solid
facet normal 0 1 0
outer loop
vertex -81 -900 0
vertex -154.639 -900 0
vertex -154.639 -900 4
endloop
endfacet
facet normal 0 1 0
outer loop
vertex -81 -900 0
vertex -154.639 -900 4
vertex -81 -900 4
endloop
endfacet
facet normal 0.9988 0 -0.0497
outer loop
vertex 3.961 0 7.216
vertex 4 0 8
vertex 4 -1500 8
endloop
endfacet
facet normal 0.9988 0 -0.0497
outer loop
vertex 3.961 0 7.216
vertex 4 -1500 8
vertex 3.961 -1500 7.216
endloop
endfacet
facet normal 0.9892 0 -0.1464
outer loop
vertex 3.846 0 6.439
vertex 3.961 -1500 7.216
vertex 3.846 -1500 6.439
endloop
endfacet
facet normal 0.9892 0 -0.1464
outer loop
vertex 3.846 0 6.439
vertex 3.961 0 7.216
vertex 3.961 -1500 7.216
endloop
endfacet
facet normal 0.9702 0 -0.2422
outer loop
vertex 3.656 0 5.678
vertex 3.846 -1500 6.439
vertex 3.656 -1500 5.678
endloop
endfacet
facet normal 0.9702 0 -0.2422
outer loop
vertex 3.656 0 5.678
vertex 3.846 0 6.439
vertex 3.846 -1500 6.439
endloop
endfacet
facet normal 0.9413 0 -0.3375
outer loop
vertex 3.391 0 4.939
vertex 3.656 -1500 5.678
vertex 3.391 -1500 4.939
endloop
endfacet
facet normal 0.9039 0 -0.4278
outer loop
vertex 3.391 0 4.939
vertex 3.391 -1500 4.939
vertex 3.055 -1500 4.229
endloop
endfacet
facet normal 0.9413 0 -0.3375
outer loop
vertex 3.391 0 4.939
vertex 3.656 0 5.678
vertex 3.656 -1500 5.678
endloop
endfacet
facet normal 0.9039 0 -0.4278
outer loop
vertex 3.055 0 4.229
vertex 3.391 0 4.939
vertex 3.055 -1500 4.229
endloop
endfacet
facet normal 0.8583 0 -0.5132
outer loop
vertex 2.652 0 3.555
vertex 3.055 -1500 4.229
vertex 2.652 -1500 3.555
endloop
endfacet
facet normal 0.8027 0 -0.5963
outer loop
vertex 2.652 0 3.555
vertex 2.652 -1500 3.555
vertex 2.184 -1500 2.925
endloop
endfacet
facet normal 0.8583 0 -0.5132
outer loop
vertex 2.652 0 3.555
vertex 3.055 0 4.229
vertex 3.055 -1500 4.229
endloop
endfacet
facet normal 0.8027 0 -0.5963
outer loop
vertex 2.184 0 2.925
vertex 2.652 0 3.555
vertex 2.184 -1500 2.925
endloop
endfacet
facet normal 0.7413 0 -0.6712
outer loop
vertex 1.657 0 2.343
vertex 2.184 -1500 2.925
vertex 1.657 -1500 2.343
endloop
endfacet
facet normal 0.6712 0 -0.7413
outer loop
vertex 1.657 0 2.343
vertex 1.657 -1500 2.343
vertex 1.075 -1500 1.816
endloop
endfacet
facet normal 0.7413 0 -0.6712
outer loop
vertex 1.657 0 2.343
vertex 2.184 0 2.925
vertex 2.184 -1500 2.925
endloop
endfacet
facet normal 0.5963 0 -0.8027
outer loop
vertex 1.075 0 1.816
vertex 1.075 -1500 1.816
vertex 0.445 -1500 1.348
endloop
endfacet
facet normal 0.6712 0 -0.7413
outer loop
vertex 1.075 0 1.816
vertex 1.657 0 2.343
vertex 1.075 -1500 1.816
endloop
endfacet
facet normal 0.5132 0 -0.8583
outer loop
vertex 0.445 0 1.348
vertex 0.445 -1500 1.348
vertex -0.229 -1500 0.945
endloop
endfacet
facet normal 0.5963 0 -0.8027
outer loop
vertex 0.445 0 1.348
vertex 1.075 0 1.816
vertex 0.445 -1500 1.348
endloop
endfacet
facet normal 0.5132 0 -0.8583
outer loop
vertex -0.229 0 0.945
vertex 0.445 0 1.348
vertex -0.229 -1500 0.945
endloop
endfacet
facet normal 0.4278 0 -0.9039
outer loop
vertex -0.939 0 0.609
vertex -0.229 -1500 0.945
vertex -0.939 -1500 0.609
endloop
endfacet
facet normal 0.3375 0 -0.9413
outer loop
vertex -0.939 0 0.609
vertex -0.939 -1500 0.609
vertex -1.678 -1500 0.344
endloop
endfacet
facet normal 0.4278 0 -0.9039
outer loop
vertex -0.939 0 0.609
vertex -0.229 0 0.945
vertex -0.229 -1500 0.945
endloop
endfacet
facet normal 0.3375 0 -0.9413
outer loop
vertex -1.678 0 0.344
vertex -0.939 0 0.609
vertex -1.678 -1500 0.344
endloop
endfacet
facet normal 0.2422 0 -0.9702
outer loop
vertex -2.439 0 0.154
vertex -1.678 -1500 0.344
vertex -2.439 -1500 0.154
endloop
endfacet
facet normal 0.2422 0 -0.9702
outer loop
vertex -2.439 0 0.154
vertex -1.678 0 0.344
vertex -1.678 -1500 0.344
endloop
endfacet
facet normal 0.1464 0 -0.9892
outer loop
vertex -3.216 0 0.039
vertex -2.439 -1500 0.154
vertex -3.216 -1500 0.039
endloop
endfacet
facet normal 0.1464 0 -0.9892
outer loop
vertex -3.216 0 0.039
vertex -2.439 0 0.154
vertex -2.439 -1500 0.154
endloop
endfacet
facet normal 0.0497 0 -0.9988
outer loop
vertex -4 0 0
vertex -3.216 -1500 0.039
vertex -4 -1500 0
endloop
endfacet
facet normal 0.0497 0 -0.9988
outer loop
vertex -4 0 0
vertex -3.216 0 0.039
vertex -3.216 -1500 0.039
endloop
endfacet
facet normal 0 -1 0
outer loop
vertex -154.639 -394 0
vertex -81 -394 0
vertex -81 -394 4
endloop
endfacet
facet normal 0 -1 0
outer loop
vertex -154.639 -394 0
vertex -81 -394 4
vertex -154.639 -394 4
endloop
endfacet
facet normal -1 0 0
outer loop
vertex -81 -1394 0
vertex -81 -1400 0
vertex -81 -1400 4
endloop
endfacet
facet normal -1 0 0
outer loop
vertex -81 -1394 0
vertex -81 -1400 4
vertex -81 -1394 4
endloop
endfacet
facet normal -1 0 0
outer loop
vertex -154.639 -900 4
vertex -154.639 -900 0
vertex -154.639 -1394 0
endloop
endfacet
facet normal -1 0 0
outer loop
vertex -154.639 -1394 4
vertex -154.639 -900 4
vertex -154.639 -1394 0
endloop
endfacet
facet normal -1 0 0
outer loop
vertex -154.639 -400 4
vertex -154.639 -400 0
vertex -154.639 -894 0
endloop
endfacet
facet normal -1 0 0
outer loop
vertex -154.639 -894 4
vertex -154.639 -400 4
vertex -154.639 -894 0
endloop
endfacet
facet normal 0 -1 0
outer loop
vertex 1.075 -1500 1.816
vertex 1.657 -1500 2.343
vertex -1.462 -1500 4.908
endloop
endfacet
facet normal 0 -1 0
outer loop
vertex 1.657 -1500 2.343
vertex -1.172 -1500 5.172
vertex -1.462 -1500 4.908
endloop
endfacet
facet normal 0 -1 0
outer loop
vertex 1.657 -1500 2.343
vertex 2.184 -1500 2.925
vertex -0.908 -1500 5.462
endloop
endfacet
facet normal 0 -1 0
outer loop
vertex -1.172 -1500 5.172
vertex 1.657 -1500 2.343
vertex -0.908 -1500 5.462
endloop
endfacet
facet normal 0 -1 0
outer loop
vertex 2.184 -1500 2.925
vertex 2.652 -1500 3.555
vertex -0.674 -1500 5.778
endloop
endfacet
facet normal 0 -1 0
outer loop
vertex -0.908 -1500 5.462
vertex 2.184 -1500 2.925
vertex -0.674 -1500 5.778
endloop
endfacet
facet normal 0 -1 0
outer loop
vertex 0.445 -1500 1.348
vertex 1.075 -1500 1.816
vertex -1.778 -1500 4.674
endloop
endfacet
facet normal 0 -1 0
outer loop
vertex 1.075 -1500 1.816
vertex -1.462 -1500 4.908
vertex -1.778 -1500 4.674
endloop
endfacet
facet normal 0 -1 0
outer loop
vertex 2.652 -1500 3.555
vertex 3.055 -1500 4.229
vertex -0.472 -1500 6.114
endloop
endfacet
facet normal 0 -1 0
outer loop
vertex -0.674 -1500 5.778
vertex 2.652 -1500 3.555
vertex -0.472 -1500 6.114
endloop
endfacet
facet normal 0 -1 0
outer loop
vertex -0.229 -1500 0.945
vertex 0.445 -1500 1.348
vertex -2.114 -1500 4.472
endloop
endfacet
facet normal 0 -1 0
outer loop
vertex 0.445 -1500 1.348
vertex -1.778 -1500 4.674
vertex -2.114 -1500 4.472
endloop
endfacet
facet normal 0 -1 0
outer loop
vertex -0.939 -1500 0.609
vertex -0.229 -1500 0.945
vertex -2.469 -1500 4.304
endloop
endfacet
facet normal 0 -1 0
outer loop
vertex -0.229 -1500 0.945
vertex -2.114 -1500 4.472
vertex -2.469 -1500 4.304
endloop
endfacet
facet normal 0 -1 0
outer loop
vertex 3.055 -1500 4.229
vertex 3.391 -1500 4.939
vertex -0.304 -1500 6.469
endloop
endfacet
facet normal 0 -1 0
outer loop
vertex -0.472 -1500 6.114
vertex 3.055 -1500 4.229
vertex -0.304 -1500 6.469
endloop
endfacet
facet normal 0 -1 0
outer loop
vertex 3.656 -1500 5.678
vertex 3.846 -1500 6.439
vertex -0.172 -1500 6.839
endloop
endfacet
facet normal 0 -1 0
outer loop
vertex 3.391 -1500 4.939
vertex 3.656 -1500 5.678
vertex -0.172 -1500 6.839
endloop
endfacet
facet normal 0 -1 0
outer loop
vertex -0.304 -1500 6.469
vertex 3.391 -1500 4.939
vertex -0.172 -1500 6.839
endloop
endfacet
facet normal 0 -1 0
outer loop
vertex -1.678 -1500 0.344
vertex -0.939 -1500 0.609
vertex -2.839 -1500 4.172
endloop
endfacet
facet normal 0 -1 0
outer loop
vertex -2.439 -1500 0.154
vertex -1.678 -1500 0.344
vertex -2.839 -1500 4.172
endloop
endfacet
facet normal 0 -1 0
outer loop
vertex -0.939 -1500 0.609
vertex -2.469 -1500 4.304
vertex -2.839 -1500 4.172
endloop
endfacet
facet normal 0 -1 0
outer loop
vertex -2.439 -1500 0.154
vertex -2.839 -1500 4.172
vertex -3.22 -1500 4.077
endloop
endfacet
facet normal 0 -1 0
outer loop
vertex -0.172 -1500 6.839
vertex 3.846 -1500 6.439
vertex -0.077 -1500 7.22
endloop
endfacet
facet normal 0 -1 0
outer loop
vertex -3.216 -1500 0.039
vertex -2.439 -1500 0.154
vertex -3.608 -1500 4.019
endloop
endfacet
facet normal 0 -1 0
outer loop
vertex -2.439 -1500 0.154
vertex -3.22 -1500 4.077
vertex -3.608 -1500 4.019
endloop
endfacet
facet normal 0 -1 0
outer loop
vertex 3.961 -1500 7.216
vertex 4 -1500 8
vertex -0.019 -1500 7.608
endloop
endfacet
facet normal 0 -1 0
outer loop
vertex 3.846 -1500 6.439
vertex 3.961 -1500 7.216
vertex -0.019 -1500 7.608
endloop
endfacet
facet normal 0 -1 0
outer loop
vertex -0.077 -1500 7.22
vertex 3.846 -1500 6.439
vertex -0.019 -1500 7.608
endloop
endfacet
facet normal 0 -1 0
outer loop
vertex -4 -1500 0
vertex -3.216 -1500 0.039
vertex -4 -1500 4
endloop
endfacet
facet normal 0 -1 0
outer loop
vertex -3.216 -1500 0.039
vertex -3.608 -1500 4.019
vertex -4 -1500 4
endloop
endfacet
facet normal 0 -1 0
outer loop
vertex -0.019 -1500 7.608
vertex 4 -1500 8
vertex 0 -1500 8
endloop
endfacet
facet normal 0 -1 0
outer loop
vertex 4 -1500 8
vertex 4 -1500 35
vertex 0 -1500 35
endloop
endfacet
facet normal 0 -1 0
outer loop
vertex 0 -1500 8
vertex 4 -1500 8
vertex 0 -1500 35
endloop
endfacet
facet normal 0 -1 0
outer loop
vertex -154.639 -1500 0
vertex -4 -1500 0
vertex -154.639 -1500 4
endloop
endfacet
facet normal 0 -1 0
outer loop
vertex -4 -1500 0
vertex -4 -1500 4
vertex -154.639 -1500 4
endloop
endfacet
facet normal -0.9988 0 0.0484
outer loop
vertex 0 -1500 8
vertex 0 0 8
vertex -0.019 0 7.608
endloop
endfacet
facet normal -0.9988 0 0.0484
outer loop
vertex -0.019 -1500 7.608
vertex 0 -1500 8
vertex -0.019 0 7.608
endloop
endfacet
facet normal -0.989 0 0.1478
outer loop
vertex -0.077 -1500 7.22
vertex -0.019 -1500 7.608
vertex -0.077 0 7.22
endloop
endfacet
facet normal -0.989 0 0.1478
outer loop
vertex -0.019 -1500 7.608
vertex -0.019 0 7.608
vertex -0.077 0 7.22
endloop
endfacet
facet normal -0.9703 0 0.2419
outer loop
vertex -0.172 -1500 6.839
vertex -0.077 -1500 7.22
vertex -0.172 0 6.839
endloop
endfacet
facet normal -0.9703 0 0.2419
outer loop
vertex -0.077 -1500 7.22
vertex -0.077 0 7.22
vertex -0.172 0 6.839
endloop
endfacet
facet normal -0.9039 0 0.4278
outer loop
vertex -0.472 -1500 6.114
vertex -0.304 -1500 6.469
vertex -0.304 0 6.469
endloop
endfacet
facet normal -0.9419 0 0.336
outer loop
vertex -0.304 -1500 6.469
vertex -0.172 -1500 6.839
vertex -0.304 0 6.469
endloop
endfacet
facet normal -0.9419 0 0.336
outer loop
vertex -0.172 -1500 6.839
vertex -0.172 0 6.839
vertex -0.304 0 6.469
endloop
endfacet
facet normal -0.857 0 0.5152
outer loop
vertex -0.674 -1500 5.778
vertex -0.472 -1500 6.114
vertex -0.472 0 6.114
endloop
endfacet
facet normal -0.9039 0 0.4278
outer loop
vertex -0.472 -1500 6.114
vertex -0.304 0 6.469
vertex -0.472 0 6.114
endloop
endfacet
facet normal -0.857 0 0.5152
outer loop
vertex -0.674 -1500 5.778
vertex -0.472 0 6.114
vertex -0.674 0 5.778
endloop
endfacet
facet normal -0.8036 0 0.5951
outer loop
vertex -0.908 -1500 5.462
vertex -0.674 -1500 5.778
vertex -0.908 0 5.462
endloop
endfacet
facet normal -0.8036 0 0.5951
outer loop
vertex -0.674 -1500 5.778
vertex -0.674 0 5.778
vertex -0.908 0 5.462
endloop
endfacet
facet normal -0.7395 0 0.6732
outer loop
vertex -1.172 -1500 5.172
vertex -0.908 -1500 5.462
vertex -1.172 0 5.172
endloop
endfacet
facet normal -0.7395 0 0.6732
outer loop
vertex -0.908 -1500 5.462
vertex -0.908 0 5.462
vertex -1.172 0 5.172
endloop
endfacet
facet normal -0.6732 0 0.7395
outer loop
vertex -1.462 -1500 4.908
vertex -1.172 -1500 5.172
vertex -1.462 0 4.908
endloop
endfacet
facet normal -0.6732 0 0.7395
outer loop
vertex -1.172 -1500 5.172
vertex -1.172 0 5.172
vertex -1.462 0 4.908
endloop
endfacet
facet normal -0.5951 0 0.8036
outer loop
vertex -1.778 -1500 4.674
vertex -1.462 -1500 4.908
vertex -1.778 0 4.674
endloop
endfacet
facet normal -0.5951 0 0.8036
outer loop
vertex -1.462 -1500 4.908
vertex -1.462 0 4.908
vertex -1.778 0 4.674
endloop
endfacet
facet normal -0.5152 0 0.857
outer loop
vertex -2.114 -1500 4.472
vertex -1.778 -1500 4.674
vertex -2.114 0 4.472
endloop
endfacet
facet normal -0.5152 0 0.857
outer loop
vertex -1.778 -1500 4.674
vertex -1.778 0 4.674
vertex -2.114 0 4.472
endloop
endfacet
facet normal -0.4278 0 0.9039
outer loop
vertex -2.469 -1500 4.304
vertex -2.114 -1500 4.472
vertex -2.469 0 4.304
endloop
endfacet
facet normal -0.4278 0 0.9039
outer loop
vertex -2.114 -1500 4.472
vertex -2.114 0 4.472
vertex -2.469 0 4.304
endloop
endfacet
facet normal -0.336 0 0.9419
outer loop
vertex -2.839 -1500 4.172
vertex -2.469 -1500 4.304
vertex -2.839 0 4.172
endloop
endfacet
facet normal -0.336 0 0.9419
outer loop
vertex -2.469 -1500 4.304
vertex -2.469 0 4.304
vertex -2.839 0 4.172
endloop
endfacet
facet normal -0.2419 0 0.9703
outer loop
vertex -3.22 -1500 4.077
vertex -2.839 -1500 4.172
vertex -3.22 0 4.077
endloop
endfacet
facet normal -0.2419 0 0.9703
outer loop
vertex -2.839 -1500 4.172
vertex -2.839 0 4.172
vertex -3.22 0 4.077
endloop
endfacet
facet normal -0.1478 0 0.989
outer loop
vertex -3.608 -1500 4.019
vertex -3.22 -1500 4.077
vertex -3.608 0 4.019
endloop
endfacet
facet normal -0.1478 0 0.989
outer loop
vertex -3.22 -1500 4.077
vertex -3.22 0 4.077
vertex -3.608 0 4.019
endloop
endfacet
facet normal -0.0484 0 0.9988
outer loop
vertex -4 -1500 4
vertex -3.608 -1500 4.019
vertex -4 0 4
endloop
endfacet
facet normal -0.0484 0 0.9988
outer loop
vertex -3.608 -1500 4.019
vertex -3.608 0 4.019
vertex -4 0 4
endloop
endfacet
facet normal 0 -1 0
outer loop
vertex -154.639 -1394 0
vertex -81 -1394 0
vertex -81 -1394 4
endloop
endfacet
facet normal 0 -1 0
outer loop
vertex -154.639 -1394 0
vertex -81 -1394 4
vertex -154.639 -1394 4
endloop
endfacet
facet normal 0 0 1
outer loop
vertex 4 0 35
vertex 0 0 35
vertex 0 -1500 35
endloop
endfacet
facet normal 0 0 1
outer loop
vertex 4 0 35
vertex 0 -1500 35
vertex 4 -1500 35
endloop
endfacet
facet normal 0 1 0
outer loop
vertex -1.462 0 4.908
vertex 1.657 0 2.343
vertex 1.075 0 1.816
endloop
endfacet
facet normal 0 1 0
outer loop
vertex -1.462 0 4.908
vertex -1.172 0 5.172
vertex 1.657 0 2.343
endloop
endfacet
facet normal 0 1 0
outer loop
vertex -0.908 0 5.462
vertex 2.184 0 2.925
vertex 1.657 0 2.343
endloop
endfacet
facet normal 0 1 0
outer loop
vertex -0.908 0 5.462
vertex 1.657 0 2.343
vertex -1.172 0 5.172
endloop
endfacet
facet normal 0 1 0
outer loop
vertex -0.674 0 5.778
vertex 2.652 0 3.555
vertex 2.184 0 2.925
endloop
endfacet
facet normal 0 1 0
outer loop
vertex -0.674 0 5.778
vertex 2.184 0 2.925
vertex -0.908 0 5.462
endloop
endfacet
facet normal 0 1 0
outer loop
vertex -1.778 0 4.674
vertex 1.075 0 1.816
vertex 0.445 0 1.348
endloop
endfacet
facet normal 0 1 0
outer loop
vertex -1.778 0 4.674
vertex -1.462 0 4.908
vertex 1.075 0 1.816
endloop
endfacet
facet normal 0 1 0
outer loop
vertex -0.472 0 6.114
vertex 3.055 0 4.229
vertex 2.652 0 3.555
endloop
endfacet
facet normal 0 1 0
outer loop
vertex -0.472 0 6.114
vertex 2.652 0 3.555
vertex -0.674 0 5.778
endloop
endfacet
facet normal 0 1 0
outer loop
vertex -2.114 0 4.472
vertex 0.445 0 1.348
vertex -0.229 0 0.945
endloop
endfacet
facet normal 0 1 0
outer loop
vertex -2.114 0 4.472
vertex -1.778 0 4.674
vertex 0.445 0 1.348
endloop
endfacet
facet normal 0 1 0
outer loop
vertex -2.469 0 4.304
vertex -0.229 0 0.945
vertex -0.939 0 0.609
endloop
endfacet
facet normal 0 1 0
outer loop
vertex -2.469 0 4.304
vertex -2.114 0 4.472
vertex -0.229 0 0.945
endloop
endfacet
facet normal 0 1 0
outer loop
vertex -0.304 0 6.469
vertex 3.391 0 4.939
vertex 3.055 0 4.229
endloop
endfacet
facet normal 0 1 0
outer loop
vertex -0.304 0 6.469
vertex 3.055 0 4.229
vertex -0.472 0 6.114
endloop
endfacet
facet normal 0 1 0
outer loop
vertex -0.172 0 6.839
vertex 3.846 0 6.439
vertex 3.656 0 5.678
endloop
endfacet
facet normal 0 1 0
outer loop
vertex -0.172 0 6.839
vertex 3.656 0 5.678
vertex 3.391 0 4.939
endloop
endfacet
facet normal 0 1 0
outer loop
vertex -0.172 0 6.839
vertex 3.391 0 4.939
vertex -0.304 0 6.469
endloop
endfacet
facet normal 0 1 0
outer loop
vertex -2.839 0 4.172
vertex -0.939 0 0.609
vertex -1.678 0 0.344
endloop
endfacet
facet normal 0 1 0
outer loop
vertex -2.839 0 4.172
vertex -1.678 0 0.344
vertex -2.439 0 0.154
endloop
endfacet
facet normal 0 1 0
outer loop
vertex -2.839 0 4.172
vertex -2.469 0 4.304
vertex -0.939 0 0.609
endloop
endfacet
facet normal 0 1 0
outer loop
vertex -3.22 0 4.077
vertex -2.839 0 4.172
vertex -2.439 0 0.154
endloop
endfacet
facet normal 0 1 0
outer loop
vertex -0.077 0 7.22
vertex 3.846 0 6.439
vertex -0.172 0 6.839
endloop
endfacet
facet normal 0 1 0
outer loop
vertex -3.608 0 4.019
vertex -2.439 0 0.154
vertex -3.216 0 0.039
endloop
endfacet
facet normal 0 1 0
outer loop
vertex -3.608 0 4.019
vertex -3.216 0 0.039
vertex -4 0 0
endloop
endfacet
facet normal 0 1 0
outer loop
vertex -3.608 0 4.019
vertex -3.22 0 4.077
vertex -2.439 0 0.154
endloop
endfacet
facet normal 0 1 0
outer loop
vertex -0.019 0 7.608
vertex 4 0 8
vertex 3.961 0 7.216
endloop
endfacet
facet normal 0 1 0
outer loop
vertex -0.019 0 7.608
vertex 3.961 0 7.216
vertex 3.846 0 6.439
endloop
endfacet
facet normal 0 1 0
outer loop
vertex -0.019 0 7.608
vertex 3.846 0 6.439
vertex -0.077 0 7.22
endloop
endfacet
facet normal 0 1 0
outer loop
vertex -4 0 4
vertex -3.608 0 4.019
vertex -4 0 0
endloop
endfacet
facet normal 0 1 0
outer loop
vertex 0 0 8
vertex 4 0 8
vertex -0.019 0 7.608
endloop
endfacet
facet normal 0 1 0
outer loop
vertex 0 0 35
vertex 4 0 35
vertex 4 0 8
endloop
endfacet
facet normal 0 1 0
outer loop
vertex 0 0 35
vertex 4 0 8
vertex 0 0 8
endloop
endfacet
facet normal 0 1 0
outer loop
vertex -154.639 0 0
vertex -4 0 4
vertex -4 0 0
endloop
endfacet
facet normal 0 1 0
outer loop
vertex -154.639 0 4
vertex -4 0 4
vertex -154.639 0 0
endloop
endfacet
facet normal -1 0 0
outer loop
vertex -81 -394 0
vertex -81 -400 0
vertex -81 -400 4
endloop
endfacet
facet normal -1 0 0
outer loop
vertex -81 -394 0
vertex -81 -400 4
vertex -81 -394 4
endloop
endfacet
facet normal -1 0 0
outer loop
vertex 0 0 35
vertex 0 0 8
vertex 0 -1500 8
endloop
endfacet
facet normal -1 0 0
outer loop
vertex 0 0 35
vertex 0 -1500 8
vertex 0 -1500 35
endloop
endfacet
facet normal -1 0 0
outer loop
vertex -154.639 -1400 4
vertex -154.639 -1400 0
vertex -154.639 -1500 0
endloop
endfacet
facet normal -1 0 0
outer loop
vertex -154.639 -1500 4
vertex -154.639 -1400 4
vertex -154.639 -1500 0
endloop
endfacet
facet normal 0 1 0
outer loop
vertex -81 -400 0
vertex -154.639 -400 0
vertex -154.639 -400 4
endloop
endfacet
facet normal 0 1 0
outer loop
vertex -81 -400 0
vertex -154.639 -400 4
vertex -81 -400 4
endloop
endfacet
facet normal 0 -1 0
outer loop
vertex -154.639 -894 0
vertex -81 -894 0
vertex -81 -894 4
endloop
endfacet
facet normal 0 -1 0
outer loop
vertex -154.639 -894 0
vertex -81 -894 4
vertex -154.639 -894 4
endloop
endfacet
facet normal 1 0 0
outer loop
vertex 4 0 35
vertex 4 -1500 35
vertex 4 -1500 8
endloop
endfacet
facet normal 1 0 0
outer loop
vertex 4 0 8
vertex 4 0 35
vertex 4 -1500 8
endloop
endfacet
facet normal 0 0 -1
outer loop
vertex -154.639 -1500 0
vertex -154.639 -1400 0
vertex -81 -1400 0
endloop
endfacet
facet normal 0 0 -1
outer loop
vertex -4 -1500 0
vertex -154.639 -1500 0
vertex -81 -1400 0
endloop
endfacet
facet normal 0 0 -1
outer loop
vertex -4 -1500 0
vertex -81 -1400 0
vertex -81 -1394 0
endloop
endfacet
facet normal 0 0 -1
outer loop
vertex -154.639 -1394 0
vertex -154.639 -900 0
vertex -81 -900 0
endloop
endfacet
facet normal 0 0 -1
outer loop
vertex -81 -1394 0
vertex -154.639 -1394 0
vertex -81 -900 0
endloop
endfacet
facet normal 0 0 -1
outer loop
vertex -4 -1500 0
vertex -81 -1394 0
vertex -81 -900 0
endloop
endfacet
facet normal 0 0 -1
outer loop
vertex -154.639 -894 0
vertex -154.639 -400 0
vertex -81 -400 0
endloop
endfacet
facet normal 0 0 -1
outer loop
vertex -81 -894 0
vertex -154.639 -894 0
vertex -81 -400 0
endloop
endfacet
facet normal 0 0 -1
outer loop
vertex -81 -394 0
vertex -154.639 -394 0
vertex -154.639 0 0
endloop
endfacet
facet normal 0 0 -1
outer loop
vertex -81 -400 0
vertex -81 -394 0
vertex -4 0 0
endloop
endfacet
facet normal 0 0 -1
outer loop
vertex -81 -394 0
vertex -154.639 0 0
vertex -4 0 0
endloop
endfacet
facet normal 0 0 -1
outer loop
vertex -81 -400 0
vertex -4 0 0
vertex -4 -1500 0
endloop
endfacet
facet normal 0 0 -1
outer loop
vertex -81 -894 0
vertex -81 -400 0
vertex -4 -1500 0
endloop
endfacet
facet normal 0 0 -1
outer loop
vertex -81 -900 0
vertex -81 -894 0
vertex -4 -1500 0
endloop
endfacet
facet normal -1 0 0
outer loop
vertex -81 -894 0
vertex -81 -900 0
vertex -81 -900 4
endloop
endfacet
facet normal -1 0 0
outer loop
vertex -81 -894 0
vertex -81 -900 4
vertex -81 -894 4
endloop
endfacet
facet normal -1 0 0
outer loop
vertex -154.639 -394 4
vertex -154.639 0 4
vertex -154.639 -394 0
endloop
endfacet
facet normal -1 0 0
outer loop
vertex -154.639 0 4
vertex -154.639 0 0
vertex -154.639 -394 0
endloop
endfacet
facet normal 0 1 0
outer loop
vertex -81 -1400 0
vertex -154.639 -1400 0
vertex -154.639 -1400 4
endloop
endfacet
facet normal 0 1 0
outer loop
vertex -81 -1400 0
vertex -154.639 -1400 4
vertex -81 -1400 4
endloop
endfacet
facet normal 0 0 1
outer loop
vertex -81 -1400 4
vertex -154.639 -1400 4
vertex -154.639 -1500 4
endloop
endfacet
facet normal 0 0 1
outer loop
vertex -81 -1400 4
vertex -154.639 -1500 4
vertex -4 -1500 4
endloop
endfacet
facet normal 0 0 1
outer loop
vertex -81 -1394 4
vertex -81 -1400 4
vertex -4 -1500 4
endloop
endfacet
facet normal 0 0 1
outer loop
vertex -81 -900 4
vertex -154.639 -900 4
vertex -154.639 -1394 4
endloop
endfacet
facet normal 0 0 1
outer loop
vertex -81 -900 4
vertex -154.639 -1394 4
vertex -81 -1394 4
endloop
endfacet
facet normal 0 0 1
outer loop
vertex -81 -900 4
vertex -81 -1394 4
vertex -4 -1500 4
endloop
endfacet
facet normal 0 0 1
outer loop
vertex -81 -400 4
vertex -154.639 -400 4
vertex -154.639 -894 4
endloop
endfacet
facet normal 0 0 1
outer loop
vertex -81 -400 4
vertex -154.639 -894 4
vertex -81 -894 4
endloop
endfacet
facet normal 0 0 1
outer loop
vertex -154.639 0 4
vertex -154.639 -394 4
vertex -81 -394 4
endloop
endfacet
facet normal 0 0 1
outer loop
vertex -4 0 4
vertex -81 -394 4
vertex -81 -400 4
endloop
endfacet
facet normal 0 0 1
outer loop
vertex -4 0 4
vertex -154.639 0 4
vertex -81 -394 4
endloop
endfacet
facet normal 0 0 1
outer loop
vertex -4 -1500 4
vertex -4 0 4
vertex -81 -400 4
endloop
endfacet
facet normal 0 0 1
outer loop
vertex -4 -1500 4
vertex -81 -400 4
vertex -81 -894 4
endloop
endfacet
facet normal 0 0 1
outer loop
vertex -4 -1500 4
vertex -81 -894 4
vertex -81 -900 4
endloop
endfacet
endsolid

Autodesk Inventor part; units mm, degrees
ref_plane "YZ Plane" through (0, 0, 0) normal (1, 0, 0) x (0, 1, 0)
ref_plane "XZ Plane" through (0, 0, 0) normal (0, 1, 0) x (-1, 0, 0)
ref_plane "XY Plane" through (0, 0, 0) normal (0, 0, 1) x (1, 0, 0)
sketch "Sketch1" plane through (0, 0, 0) normal (0, 0, 1) x (1, 0, 0)
  line L0 (0, 0) -> (-154.6388, 0)
  line L1 (-154.6388, 0) -> (-154.6388, -1500)
  line L2 (-154.6388, -1500) -> (0, -1500)
  line L3 (0, -1500) -> (0, 0)
  line L4 (-154.6388, -1400) -> (-81, -1400)
  line L5 (-81, -1400) -> (-81, -1394)
  line L6 (-81, -1394) -> (-154.6388, -1394)
  line L7 (-154.6388, -1394) -> (-154.6388, -1400)
  line L8 (-154.6388, -900) -> (-81, -900)
  line L9 (-81, -900) -> (-81, -894)
  line L10 (-81, -894) -> (-154.6388, -894)
  line L11 (-154.6388, -894) -> (-154.6388, -900)
  line L12 (-154.6388, -400) -> (-81, -400)
  line L13 (-81, -400) -> (-81, -394)
  line L14 (-81, -394) -> (-154.6388, -394)
  line L15 (-154.6388, -394) -> (-154.6388, -400)
  point P0 (-154.6388, -900)
  point P1 (-154.6388, -1394)
  dimension "d0" = 1500
  dimension "d1" = 154.6388
  dimension "d2" = 6
  dimension "d4" = 100
  dimension "d7" = 500
  dimension "d23" = 81
extrude "Plate1" add sketch "Sketch1" along normal blind 4 contours L3 L2 L1 L4 L5 L6 L8 L9 L10 L12 L13 L14 L0
sketch "Sketch2" plane through (4, 0, 0) normal (-1, 0, 0) x (0, -1, 0)
  line L0 (1500, 0) -> (0, 0)
  line L1 (0, 0) -> (0, 35)
  line L2 (0, 35) -> (1500, 35)
  line L3 (1500, 35) -> (1500, 0)
edge flange "Flange1" height 35 angle 90 thickness 4 bend radius 4 thickness toward (-1, 0, 0) relief tear relief width 4 relief depth 2 edges at (0, -750, 4) wall of the first edge with corners at (4, -1500, 0) (4, 0, 0) (4, 0, 35) (4, -1500, 35)
bend "Bend1"
corner "Corner1"
equation "\"d1\" = Stringer2_2_deep"
equation "\"d12\" = Thickness"
equation "\"d13\" = BendReliefWidth"
equation "\"d14\" = BendReliefDepth"
equation "\"d15\" = MinimumRemnant"
equation "\"d16\" = TransitionRadius"
equation "\"d19\" = BendRadius"
equation "\"d20\" = CornerReliefSize"
equation "\"d21\" = GapSize"
equation "\"d22\" = JacobiRadiusSize"
equation "\"BendRadius\" = Thickness"
equation "\"BendReliefWidth\" = Thickness"
equation "\"BendReliefDepth\" = 0.5 * Thickness"
equation "\"CornerReliefSize\" = 4 * Thickness"
equation "\"MinimumRemnant\" = 2 * Thickness"
equation "\"TransitionRadius\" = BendRadius"
equation "\"JacobiRadiusSize\" = BendRadius"
equation "\"GapSize\" = Thickness"
equation "\"Stringer2_2_deep\" = 154.638781"
equation "\"Thickness\" = 4"
properties part number "stringer 1.2_CPY2"
